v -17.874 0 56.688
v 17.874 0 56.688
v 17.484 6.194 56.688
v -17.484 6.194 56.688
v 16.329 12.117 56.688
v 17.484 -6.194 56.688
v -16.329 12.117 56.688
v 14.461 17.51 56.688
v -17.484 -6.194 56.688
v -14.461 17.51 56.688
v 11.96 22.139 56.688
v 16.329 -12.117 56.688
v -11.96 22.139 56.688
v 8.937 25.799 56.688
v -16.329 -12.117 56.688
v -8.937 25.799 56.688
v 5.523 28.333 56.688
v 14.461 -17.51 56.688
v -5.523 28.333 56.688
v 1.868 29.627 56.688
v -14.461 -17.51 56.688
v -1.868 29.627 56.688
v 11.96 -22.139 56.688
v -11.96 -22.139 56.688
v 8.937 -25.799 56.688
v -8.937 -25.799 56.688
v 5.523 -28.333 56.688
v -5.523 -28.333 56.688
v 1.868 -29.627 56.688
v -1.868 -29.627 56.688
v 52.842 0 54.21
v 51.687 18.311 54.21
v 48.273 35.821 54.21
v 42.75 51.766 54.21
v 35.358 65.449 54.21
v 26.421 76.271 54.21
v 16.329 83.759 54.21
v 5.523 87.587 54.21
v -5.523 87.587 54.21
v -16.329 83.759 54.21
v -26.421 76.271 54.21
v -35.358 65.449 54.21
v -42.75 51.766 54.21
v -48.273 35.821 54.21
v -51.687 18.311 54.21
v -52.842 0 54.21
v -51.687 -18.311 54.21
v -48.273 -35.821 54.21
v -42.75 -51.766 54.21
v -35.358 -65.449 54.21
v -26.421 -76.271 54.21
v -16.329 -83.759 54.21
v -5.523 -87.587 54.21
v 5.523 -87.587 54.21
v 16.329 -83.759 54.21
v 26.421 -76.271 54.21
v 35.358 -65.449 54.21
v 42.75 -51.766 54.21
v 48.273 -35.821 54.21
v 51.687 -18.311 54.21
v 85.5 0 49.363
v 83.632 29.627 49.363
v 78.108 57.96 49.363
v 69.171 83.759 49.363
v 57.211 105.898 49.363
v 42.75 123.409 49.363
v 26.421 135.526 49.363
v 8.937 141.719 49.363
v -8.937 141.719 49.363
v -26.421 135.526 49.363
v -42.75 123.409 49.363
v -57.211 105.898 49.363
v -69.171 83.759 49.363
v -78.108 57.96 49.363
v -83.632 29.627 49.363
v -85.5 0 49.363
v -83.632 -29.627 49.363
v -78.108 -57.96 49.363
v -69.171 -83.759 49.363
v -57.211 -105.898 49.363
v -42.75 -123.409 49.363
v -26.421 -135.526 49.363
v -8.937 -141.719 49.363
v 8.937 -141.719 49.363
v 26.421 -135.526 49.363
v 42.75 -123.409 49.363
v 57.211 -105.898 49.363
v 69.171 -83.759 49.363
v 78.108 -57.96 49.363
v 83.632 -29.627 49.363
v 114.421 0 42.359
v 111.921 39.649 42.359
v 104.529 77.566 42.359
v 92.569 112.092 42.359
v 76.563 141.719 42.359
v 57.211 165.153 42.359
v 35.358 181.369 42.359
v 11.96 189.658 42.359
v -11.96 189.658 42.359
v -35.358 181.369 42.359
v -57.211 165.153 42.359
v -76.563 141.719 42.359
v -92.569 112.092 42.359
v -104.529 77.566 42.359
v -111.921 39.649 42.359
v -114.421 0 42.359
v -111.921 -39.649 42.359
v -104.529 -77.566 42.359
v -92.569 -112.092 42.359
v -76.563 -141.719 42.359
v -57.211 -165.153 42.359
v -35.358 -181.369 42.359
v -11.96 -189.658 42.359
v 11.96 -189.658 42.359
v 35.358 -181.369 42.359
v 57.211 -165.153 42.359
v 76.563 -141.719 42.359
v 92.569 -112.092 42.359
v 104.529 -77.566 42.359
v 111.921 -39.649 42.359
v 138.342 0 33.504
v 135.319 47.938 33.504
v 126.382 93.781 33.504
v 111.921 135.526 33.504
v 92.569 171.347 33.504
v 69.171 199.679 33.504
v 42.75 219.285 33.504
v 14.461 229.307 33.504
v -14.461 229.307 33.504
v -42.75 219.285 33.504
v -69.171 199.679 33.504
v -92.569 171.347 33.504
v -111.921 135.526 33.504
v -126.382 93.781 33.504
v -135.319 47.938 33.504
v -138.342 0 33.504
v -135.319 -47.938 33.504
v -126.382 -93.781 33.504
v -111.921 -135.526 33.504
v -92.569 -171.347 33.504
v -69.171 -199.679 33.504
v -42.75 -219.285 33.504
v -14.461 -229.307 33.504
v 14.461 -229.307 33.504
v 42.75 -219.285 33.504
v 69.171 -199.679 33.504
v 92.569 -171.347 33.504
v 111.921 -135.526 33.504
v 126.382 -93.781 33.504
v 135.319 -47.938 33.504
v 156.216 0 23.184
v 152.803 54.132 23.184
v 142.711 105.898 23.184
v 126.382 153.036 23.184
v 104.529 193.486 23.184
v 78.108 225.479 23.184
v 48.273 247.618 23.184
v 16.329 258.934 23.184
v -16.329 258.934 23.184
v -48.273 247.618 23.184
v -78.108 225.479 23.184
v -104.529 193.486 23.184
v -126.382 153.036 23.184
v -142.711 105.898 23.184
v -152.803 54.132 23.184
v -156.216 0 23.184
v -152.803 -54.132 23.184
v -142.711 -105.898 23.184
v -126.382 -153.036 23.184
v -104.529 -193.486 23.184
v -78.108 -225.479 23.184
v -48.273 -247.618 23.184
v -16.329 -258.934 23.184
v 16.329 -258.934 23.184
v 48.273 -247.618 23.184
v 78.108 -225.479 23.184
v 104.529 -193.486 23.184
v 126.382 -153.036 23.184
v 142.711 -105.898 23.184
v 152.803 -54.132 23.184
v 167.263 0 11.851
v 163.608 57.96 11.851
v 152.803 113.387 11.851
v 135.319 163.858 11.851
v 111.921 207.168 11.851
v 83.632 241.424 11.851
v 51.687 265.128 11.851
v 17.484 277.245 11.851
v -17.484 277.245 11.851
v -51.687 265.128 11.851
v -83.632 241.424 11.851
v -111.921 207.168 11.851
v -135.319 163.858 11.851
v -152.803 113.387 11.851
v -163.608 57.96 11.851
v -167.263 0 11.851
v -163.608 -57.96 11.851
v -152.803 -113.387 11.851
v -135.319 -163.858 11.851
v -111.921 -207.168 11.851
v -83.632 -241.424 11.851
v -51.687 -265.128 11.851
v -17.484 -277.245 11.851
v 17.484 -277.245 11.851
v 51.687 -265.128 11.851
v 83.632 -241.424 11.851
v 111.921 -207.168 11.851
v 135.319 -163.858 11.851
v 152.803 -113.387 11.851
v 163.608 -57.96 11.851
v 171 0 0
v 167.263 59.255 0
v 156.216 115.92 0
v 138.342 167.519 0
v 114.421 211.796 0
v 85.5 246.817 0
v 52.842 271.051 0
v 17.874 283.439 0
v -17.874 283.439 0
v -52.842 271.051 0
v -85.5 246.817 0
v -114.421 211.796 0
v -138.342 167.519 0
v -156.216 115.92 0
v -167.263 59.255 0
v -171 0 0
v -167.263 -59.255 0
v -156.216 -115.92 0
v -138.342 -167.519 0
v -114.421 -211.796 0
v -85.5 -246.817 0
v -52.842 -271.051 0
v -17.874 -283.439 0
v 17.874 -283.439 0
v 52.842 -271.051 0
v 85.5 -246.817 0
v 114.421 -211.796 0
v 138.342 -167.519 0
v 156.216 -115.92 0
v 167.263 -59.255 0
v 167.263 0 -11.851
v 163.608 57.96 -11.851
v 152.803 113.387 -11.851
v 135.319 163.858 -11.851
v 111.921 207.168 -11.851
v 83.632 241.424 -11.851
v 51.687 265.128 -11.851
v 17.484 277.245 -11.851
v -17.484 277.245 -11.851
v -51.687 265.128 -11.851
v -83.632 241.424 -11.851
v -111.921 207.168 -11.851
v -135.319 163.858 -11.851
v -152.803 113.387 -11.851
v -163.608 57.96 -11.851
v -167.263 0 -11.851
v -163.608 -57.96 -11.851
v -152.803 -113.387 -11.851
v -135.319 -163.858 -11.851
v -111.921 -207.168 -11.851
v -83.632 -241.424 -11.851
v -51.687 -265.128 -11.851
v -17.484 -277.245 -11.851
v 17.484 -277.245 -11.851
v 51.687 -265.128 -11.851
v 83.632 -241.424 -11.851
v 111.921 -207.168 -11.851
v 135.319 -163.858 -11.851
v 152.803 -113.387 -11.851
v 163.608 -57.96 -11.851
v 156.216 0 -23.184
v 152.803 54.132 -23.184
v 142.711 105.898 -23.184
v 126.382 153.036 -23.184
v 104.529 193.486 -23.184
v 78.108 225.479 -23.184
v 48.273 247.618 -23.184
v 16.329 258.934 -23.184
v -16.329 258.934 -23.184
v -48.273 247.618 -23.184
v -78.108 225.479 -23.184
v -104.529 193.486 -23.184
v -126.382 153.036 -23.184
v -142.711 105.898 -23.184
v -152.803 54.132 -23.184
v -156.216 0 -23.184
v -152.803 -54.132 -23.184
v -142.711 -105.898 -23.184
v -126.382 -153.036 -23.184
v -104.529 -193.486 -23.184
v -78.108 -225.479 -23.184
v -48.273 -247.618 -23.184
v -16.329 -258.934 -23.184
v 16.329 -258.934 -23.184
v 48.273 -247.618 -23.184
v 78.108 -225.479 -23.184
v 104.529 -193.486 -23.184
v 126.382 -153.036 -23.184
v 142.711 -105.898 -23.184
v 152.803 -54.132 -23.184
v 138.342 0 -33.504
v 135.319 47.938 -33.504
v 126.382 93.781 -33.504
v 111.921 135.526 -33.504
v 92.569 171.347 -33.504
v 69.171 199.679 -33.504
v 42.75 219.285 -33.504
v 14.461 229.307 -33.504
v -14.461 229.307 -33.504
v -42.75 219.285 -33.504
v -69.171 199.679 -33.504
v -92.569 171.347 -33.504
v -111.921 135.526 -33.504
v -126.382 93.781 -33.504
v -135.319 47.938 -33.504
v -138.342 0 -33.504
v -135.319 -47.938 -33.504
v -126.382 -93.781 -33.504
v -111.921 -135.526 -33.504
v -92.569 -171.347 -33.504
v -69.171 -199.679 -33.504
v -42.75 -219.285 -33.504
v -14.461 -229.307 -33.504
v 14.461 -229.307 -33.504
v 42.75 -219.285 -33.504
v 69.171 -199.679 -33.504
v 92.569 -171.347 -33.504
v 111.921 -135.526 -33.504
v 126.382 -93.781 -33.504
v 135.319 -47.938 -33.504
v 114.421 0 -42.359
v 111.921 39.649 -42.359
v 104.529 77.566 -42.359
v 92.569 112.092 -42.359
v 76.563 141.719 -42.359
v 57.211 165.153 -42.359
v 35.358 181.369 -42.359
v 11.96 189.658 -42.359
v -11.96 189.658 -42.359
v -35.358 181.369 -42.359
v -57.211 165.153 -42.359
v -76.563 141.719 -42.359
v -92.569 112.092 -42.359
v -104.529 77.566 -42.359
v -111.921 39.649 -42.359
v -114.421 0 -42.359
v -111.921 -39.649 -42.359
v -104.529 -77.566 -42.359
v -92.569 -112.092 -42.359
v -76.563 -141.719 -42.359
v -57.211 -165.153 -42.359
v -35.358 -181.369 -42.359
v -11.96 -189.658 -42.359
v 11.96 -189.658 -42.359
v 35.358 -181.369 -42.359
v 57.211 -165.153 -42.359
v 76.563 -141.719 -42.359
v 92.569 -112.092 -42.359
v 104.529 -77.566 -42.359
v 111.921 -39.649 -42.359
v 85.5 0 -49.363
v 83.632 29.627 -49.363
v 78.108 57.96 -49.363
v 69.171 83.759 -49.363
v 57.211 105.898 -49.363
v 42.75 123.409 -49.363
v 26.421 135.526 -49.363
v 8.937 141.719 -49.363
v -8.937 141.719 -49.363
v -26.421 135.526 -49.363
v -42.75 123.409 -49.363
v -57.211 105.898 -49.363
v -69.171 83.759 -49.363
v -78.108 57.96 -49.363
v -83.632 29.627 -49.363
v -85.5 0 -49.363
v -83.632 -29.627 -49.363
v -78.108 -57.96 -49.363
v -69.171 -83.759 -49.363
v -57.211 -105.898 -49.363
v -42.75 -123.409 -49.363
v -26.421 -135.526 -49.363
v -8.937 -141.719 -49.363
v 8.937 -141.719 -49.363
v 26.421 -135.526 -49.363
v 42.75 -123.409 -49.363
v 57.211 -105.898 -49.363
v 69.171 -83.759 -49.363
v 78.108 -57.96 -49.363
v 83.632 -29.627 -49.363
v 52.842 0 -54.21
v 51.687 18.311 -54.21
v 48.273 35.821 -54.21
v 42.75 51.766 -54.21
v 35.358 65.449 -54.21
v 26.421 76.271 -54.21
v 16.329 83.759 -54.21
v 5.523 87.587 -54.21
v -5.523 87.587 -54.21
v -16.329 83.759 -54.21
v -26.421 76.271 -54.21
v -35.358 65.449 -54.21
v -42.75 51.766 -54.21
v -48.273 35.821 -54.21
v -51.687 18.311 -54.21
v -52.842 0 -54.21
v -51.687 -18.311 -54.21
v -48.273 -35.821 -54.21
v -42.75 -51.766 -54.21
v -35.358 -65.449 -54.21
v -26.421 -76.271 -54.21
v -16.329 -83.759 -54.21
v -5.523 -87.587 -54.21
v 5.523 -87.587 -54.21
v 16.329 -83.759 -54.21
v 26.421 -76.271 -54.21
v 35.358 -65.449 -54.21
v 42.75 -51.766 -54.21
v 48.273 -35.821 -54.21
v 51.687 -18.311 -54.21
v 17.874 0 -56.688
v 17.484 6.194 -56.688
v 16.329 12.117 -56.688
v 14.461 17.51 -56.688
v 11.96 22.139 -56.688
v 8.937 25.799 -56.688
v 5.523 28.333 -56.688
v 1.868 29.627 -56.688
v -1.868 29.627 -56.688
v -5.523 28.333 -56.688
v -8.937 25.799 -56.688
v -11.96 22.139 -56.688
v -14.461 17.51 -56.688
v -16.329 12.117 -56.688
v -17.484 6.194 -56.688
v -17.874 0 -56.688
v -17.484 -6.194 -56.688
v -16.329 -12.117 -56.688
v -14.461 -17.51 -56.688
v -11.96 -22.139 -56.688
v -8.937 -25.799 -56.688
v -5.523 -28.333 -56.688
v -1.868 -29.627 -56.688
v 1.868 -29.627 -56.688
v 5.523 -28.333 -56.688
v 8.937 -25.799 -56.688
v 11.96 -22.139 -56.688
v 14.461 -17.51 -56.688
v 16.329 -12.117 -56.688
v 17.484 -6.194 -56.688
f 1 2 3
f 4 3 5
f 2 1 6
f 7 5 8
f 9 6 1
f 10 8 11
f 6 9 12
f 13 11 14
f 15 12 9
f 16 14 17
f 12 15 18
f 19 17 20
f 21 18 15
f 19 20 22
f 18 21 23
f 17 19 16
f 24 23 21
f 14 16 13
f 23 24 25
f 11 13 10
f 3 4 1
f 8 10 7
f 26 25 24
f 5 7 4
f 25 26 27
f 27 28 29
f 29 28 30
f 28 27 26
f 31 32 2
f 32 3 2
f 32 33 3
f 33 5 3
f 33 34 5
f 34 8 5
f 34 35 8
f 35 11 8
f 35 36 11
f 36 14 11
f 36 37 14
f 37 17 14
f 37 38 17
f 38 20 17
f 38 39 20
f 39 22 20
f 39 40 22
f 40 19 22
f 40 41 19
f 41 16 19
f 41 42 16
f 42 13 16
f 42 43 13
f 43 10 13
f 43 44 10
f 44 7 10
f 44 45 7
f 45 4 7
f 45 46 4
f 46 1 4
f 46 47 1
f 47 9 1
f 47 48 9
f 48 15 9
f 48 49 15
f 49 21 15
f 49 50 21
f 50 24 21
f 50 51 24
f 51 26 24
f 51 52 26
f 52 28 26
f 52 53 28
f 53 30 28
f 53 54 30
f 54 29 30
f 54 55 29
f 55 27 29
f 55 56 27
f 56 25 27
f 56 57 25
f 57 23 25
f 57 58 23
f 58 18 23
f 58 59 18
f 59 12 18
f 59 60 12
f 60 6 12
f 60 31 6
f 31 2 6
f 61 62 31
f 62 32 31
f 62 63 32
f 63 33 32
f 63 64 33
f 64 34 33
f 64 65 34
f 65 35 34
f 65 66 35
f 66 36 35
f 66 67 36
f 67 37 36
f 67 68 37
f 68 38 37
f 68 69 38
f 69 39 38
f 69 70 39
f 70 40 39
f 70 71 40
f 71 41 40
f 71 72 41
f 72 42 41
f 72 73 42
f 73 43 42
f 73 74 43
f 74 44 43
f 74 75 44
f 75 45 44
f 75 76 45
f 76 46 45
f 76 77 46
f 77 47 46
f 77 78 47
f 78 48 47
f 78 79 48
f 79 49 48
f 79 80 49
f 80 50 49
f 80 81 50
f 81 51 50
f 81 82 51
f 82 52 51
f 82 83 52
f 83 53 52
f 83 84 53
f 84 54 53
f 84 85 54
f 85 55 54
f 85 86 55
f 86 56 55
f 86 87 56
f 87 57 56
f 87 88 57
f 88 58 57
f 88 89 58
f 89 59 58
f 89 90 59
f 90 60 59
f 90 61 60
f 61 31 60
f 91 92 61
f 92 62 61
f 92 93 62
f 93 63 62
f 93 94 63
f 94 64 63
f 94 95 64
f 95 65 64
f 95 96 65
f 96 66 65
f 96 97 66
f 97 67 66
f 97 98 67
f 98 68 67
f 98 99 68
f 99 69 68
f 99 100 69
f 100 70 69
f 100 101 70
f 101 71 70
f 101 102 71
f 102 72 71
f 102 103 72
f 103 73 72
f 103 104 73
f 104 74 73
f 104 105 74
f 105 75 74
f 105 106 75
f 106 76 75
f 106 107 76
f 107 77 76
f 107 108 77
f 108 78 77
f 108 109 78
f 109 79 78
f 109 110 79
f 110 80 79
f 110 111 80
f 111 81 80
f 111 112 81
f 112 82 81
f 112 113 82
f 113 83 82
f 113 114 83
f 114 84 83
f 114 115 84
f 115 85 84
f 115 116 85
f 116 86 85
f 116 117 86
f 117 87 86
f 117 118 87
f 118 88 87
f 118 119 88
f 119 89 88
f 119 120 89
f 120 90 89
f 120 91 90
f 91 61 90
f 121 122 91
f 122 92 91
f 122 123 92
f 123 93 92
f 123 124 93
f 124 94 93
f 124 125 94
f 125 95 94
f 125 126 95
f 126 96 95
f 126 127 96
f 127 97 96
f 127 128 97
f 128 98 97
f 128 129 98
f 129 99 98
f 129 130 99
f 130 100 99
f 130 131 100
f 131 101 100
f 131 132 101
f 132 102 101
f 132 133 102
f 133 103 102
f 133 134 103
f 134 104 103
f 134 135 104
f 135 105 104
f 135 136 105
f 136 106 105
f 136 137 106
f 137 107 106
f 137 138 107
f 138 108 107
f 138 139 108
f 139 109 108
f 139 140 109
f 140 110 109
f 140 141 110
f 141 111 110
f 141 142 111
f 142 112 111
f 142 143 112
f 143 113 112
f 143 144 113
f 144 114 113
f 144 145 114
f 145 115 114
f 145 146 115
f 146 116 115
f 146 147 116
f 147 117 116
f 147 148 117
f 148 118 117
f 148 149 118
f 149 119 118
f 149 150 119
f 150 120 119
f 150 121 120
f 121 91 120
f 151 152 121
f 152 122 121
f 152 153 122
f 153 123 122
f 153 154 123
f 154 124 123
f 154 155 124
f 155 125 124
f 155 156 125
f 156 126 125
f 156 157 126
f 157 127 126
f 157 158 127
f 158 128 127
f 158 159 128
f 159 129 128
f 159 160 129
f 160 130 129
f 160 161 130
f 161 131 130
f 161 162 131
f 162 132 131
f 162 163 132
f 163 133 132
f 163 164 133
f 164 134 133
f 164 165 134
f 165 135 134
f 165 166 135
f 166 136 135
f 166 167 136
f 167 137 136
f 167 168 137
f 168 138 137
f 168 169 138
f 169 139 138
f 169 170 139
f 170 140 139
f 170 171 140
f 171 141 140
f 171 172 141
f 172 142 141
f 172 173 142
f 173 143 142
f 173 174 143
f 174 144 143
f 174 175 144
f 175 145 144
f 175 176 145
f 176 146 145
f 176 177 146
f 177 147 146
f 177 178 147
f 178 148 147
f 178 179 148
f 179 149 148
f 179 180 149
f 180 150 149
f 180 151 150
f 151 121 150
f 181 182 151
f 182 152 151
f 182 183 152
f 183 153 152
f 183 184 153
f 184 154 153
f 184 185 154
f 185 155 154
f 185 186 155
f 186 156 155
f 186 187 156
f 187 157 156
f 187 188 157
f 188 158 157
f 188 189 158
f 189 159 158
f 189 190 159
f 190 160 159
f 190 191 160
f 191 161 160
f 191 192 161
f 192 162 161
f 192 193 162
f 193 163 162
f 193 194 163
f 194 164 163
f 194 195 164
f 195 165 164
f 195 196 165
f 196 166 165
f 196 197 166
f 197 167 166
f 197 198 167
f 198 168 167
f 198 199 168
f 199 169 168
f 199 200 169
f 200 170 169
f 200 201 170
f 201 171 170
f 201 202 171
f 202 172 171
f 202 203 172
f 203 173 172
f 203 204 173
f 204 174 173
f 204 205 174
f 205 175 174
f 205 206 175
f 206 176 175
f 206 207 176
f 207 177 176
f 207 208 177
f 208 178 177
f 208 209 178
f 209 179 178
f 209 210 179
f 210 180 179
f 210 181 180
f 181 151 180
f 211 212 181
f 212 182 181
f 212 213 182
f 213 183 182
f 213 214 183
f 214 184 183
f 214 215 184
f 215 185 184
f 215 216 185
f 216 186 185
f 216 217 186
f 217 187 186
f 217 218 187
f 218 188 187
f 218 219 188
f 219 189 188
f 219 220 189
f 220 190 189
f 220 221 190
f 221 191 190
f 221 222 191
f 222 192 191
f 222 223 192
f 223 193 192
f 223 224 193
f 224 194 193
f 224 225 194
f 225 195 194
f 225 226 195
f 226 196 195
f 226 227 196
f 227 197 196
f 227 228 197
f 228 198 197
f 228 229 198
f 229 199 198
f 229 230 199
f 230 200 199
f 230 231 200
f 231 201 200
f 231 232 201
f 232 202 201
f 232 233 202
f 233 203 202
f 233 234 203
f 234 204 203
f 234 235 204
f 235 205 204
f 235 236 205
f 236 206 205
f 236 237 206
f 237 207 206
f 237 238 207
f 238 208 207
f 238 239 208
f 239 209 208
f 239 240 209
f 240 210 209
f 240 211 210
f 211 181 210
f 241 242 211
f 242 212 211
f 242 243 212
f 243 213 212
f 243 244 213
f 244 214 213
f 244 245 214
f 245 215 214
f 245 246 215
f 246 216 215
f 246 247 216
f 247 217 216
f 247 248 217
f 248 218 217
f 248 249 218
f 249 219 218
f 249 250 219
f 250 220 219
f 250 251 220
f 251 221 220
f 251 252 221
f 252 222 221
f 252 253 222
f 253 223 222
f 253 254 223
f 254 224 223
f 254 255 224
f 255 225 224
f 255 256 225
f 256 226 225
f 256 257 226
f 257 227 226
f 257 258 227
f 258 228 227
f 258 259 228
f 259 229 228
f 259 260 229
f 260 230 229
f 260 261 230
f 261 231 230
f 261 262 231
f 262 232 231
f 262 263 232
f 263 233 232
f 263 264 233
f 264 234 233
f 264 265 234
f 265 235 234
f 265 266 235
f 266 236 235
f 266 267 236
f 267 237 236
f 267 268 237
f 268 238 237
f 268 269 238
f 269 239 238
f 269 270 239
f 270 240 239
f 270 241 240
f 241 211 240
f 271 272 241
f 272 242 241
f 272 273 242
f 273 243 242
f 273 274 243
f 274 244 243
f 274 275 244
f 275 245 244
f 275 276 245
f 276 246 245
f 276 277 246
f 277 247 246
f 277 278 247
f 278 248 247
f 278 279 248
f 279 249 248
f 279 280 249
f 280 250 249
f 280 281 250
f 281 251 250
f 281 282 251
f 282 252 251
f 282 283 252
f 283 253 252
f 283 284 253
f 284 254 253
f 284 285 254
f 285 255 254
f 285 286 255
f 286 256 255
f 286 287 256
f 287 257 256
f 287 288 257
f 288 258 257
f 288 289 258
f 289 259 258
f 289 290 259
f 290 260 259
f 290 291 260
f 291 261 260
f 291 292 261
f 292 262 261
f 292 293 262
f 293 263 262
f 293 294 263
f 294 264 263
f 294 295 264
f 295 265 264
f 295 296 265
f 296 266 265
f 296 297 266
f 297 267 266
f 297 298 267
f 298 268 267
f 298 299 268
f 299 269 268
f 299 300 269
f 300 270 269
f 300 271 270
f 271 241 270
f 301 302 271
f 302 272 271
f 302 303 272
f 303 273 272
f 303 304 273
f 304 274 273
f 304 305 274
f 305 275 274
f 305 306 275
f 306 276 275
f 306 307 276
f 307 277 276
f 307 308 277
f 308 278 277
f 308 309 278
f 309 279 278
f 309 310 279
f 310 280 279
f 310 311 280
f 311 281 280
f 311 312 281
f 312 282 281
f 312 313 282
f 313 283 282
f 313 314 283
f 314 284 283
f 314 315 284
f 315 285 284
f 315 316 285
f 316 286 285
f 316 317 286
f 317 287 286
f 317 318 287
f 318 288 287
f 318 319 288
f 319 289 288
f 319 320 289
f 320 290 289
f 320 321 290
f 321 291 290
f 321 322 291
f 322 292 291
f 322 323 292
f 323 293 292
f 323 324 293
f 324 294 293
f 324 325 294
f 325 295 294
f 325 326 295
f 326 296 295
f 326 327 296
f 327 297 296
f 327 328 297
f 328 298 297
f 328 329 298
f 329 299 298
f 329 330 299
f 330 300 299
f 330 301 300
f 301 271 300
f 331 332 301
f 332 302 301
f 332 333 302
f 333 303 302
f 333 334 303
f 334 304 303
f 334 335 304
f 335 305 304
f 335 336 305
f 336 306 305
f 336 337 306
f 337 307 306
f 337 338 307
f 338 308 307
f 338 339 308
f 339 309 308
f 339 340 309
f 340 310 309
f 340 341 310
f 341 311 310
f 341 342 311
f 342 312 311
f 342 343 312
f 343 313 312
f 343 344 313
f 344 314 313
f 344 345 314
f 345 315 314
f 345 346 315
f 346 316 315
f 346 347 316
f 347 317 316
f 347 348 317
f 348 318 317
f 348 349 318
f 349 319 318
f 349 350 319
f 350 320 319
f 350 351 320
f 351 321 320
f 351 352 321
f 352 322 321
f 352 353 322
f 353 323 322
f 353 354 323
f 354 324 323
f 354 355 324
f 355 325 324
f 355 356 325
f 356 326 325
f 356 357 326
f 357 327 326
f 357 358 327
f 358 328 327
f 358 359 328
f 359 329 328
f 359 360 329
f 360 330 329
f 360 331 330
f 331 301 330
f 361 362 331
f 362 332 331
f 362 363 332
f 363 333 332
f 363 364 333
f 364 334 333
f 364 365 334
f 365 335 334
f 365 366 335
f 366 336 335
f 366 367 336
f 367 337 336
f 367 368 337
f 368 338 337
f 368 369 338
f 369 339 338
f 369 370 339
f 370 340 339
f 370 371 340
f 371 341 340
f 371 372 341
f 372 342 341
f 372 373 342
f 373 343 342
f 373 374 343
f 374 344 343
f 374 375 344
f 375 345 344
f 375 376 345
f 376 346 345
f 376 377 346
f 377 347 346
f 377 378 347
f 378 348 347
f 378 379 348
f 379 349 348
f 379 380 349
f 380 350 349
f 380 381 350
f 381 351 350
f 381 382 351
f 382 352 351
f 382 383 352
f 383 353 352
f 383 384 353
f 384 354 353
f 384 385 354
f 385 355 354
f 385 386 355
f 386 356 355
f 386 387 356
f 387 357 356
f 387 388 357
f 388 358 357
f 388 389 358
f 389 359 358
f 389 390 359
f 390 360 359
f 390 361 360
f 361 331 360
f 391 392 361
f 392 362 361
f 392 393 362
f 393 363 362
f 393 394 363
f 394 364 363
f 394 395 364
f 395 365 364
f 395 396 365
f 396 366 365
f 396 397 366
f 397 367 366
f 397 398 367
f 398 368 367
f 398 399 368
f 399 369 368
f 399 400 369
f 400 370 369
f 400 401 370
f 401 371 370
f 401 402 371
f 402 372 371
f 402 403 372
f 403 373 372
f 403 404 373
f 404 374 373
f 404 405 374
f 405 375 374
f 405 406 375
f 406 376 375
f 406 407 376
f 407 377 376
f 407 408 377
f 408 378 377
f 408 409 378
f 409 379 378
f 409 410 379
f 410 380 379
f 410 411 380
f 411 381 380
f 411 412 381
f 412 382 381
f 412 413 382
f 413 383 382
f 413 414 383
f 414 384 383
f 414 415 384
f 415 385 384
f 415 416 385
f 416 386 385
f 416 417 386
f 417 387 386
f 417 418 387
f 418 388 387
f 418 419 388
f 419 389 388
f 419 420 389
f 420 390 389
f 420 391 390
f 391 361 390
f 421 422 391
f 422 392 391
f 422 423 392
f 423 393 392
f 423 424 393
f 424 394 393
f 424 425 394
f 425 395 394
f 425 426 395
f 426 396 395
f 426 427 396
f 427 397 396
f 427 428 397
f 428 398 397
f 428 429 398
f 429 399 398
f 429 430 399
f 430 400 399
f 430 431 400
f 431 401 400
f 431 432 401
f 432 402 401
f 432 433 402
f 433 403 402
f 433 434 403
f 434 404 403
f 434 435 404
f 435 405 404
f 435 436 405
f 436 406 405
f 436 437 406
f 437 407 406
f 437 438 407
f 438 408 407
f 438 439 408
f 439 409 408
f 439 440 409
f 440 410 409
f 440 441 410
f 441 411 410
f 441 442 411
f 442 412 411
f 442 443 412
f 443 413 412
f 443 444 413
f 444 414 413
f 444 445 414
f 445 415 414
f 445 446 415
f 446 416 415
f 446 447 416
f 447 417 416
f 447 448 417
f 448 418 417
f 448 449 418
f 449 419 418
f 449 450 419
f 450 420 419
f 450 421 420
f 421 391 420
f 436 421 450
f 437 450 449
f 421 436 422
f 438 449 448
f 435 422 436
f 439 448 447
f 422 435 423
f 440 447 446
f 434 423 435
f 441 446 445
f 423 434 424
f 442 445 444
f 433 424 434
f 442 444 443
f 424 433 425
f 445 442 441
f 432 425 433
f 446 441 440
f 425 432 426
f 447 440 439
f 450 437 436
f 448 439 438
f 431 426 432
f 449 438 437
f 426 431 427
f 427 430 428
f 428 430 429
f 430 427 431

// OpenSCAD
// Generated by SolidPython 1.0.1 on 2020-07-29 00:46:49


scale(v = [9, 15, 3]) {
	sphere(r = 19);
}
/***********************************************
*********      SolidPython code:      **********
************************************************
 
# import packages: SolidPython
from solid import *
from solid.utils import *
from itertools import chain, combinations, permutations


class Resize:

    def __init__(self, scad_file):
        self.scad_file = scad_file
        #self.scad_file = import_scad(scad_file)
        # cone/cylinder param:
        self.r1 = 0
        self.r2 = 0
        self.h = 0
        # rectangular prism param:
        self.w = 0
        self.l = 0
        # ellipse param:
        self.r = 0

    # import OpenScad code (file name corresponds to shape)


    # classify shape + parameters
    def assign(self, param1, param2, param3):
        if self.scad_file == 'cone.scad':
            self.r1 = param1
            self.r2 = param2
            self.h = param3
        elif self.scad_file == 'cylinder.scad':
            self.r1 = param1
            self.r2 = param2
            self.h = param3
        elif self.scad_file == 'rectangularPrism.scad':
            self.h = param1
            self.l = param2
            self.w = param3
        else:
            self.r = param1
            self.h = param2

    # resize parameters
    def iterate(self):
        x = range(3, 20, 2)
        i = 1
        if self.scad_file == 'cone.scad':
            tempList = list(permutations(x, 2))
            for temp in tempList:
                param1 = temp[0]
                param2 = temp[1]
                filepath = 'produced_scad_files/' + 'cone' + str(param1) + '_' + str(param2) + '_' + '.scad'
                scad_render_to_file(cylinder(h=param1, r1=param2, r2=0), filepath)

        elif self.scad_file == 'cylinder.scad':
            tempList = list(permutations(x, 3))
            for temp in tempList:
                param1 = temp[0]
                param2 = temp[1]
                filepath = 'produced_scad_files/' + 'cylinder' + str(param1) + '_' + str(param2) + '_' + '.scad'
                scad_render_to_file(cylinder(h=param1, r1=param2, r2=param2), filepath)

        elif self.scad_file == 'rectangularPrism.scad':
            tempList = list(permutations(x, 3))
            for temp in tempList:
                param1 = temp[0]
                param2 = temp[1]
                param3 = temp[2]
                filepath = 'produced_scad_files/' + 'rectangularPrism' + str(param1) + '_' + str(param2) + '_' + str(
                    param3) + '.scad'
                scad_render_to_file(cube(size=(param1, param2, param3)), filepath)

        elif self.scad_file == 'ellipse.scad':
            tempList = list(permutations(x, 4))
            for temp in tempList:
                param1 = temp[0]
                param2 = temp[1]
                param3 = temp[2]
                param4 = temp[3]
                filepath = 'produced_scad_files/' + 'ellipse' + str(param1) + '_' + str(param2) + '_' + str(param3) + '_' + str(param4) + '.scad'
                scad_render_to_file(scale([param1, param2, param3])(sphere(r=param4)), filepath)

    def render_to_scadfile(self):
        scad_render_to_file(scad, 'example.scad') 
 
************************************************/
